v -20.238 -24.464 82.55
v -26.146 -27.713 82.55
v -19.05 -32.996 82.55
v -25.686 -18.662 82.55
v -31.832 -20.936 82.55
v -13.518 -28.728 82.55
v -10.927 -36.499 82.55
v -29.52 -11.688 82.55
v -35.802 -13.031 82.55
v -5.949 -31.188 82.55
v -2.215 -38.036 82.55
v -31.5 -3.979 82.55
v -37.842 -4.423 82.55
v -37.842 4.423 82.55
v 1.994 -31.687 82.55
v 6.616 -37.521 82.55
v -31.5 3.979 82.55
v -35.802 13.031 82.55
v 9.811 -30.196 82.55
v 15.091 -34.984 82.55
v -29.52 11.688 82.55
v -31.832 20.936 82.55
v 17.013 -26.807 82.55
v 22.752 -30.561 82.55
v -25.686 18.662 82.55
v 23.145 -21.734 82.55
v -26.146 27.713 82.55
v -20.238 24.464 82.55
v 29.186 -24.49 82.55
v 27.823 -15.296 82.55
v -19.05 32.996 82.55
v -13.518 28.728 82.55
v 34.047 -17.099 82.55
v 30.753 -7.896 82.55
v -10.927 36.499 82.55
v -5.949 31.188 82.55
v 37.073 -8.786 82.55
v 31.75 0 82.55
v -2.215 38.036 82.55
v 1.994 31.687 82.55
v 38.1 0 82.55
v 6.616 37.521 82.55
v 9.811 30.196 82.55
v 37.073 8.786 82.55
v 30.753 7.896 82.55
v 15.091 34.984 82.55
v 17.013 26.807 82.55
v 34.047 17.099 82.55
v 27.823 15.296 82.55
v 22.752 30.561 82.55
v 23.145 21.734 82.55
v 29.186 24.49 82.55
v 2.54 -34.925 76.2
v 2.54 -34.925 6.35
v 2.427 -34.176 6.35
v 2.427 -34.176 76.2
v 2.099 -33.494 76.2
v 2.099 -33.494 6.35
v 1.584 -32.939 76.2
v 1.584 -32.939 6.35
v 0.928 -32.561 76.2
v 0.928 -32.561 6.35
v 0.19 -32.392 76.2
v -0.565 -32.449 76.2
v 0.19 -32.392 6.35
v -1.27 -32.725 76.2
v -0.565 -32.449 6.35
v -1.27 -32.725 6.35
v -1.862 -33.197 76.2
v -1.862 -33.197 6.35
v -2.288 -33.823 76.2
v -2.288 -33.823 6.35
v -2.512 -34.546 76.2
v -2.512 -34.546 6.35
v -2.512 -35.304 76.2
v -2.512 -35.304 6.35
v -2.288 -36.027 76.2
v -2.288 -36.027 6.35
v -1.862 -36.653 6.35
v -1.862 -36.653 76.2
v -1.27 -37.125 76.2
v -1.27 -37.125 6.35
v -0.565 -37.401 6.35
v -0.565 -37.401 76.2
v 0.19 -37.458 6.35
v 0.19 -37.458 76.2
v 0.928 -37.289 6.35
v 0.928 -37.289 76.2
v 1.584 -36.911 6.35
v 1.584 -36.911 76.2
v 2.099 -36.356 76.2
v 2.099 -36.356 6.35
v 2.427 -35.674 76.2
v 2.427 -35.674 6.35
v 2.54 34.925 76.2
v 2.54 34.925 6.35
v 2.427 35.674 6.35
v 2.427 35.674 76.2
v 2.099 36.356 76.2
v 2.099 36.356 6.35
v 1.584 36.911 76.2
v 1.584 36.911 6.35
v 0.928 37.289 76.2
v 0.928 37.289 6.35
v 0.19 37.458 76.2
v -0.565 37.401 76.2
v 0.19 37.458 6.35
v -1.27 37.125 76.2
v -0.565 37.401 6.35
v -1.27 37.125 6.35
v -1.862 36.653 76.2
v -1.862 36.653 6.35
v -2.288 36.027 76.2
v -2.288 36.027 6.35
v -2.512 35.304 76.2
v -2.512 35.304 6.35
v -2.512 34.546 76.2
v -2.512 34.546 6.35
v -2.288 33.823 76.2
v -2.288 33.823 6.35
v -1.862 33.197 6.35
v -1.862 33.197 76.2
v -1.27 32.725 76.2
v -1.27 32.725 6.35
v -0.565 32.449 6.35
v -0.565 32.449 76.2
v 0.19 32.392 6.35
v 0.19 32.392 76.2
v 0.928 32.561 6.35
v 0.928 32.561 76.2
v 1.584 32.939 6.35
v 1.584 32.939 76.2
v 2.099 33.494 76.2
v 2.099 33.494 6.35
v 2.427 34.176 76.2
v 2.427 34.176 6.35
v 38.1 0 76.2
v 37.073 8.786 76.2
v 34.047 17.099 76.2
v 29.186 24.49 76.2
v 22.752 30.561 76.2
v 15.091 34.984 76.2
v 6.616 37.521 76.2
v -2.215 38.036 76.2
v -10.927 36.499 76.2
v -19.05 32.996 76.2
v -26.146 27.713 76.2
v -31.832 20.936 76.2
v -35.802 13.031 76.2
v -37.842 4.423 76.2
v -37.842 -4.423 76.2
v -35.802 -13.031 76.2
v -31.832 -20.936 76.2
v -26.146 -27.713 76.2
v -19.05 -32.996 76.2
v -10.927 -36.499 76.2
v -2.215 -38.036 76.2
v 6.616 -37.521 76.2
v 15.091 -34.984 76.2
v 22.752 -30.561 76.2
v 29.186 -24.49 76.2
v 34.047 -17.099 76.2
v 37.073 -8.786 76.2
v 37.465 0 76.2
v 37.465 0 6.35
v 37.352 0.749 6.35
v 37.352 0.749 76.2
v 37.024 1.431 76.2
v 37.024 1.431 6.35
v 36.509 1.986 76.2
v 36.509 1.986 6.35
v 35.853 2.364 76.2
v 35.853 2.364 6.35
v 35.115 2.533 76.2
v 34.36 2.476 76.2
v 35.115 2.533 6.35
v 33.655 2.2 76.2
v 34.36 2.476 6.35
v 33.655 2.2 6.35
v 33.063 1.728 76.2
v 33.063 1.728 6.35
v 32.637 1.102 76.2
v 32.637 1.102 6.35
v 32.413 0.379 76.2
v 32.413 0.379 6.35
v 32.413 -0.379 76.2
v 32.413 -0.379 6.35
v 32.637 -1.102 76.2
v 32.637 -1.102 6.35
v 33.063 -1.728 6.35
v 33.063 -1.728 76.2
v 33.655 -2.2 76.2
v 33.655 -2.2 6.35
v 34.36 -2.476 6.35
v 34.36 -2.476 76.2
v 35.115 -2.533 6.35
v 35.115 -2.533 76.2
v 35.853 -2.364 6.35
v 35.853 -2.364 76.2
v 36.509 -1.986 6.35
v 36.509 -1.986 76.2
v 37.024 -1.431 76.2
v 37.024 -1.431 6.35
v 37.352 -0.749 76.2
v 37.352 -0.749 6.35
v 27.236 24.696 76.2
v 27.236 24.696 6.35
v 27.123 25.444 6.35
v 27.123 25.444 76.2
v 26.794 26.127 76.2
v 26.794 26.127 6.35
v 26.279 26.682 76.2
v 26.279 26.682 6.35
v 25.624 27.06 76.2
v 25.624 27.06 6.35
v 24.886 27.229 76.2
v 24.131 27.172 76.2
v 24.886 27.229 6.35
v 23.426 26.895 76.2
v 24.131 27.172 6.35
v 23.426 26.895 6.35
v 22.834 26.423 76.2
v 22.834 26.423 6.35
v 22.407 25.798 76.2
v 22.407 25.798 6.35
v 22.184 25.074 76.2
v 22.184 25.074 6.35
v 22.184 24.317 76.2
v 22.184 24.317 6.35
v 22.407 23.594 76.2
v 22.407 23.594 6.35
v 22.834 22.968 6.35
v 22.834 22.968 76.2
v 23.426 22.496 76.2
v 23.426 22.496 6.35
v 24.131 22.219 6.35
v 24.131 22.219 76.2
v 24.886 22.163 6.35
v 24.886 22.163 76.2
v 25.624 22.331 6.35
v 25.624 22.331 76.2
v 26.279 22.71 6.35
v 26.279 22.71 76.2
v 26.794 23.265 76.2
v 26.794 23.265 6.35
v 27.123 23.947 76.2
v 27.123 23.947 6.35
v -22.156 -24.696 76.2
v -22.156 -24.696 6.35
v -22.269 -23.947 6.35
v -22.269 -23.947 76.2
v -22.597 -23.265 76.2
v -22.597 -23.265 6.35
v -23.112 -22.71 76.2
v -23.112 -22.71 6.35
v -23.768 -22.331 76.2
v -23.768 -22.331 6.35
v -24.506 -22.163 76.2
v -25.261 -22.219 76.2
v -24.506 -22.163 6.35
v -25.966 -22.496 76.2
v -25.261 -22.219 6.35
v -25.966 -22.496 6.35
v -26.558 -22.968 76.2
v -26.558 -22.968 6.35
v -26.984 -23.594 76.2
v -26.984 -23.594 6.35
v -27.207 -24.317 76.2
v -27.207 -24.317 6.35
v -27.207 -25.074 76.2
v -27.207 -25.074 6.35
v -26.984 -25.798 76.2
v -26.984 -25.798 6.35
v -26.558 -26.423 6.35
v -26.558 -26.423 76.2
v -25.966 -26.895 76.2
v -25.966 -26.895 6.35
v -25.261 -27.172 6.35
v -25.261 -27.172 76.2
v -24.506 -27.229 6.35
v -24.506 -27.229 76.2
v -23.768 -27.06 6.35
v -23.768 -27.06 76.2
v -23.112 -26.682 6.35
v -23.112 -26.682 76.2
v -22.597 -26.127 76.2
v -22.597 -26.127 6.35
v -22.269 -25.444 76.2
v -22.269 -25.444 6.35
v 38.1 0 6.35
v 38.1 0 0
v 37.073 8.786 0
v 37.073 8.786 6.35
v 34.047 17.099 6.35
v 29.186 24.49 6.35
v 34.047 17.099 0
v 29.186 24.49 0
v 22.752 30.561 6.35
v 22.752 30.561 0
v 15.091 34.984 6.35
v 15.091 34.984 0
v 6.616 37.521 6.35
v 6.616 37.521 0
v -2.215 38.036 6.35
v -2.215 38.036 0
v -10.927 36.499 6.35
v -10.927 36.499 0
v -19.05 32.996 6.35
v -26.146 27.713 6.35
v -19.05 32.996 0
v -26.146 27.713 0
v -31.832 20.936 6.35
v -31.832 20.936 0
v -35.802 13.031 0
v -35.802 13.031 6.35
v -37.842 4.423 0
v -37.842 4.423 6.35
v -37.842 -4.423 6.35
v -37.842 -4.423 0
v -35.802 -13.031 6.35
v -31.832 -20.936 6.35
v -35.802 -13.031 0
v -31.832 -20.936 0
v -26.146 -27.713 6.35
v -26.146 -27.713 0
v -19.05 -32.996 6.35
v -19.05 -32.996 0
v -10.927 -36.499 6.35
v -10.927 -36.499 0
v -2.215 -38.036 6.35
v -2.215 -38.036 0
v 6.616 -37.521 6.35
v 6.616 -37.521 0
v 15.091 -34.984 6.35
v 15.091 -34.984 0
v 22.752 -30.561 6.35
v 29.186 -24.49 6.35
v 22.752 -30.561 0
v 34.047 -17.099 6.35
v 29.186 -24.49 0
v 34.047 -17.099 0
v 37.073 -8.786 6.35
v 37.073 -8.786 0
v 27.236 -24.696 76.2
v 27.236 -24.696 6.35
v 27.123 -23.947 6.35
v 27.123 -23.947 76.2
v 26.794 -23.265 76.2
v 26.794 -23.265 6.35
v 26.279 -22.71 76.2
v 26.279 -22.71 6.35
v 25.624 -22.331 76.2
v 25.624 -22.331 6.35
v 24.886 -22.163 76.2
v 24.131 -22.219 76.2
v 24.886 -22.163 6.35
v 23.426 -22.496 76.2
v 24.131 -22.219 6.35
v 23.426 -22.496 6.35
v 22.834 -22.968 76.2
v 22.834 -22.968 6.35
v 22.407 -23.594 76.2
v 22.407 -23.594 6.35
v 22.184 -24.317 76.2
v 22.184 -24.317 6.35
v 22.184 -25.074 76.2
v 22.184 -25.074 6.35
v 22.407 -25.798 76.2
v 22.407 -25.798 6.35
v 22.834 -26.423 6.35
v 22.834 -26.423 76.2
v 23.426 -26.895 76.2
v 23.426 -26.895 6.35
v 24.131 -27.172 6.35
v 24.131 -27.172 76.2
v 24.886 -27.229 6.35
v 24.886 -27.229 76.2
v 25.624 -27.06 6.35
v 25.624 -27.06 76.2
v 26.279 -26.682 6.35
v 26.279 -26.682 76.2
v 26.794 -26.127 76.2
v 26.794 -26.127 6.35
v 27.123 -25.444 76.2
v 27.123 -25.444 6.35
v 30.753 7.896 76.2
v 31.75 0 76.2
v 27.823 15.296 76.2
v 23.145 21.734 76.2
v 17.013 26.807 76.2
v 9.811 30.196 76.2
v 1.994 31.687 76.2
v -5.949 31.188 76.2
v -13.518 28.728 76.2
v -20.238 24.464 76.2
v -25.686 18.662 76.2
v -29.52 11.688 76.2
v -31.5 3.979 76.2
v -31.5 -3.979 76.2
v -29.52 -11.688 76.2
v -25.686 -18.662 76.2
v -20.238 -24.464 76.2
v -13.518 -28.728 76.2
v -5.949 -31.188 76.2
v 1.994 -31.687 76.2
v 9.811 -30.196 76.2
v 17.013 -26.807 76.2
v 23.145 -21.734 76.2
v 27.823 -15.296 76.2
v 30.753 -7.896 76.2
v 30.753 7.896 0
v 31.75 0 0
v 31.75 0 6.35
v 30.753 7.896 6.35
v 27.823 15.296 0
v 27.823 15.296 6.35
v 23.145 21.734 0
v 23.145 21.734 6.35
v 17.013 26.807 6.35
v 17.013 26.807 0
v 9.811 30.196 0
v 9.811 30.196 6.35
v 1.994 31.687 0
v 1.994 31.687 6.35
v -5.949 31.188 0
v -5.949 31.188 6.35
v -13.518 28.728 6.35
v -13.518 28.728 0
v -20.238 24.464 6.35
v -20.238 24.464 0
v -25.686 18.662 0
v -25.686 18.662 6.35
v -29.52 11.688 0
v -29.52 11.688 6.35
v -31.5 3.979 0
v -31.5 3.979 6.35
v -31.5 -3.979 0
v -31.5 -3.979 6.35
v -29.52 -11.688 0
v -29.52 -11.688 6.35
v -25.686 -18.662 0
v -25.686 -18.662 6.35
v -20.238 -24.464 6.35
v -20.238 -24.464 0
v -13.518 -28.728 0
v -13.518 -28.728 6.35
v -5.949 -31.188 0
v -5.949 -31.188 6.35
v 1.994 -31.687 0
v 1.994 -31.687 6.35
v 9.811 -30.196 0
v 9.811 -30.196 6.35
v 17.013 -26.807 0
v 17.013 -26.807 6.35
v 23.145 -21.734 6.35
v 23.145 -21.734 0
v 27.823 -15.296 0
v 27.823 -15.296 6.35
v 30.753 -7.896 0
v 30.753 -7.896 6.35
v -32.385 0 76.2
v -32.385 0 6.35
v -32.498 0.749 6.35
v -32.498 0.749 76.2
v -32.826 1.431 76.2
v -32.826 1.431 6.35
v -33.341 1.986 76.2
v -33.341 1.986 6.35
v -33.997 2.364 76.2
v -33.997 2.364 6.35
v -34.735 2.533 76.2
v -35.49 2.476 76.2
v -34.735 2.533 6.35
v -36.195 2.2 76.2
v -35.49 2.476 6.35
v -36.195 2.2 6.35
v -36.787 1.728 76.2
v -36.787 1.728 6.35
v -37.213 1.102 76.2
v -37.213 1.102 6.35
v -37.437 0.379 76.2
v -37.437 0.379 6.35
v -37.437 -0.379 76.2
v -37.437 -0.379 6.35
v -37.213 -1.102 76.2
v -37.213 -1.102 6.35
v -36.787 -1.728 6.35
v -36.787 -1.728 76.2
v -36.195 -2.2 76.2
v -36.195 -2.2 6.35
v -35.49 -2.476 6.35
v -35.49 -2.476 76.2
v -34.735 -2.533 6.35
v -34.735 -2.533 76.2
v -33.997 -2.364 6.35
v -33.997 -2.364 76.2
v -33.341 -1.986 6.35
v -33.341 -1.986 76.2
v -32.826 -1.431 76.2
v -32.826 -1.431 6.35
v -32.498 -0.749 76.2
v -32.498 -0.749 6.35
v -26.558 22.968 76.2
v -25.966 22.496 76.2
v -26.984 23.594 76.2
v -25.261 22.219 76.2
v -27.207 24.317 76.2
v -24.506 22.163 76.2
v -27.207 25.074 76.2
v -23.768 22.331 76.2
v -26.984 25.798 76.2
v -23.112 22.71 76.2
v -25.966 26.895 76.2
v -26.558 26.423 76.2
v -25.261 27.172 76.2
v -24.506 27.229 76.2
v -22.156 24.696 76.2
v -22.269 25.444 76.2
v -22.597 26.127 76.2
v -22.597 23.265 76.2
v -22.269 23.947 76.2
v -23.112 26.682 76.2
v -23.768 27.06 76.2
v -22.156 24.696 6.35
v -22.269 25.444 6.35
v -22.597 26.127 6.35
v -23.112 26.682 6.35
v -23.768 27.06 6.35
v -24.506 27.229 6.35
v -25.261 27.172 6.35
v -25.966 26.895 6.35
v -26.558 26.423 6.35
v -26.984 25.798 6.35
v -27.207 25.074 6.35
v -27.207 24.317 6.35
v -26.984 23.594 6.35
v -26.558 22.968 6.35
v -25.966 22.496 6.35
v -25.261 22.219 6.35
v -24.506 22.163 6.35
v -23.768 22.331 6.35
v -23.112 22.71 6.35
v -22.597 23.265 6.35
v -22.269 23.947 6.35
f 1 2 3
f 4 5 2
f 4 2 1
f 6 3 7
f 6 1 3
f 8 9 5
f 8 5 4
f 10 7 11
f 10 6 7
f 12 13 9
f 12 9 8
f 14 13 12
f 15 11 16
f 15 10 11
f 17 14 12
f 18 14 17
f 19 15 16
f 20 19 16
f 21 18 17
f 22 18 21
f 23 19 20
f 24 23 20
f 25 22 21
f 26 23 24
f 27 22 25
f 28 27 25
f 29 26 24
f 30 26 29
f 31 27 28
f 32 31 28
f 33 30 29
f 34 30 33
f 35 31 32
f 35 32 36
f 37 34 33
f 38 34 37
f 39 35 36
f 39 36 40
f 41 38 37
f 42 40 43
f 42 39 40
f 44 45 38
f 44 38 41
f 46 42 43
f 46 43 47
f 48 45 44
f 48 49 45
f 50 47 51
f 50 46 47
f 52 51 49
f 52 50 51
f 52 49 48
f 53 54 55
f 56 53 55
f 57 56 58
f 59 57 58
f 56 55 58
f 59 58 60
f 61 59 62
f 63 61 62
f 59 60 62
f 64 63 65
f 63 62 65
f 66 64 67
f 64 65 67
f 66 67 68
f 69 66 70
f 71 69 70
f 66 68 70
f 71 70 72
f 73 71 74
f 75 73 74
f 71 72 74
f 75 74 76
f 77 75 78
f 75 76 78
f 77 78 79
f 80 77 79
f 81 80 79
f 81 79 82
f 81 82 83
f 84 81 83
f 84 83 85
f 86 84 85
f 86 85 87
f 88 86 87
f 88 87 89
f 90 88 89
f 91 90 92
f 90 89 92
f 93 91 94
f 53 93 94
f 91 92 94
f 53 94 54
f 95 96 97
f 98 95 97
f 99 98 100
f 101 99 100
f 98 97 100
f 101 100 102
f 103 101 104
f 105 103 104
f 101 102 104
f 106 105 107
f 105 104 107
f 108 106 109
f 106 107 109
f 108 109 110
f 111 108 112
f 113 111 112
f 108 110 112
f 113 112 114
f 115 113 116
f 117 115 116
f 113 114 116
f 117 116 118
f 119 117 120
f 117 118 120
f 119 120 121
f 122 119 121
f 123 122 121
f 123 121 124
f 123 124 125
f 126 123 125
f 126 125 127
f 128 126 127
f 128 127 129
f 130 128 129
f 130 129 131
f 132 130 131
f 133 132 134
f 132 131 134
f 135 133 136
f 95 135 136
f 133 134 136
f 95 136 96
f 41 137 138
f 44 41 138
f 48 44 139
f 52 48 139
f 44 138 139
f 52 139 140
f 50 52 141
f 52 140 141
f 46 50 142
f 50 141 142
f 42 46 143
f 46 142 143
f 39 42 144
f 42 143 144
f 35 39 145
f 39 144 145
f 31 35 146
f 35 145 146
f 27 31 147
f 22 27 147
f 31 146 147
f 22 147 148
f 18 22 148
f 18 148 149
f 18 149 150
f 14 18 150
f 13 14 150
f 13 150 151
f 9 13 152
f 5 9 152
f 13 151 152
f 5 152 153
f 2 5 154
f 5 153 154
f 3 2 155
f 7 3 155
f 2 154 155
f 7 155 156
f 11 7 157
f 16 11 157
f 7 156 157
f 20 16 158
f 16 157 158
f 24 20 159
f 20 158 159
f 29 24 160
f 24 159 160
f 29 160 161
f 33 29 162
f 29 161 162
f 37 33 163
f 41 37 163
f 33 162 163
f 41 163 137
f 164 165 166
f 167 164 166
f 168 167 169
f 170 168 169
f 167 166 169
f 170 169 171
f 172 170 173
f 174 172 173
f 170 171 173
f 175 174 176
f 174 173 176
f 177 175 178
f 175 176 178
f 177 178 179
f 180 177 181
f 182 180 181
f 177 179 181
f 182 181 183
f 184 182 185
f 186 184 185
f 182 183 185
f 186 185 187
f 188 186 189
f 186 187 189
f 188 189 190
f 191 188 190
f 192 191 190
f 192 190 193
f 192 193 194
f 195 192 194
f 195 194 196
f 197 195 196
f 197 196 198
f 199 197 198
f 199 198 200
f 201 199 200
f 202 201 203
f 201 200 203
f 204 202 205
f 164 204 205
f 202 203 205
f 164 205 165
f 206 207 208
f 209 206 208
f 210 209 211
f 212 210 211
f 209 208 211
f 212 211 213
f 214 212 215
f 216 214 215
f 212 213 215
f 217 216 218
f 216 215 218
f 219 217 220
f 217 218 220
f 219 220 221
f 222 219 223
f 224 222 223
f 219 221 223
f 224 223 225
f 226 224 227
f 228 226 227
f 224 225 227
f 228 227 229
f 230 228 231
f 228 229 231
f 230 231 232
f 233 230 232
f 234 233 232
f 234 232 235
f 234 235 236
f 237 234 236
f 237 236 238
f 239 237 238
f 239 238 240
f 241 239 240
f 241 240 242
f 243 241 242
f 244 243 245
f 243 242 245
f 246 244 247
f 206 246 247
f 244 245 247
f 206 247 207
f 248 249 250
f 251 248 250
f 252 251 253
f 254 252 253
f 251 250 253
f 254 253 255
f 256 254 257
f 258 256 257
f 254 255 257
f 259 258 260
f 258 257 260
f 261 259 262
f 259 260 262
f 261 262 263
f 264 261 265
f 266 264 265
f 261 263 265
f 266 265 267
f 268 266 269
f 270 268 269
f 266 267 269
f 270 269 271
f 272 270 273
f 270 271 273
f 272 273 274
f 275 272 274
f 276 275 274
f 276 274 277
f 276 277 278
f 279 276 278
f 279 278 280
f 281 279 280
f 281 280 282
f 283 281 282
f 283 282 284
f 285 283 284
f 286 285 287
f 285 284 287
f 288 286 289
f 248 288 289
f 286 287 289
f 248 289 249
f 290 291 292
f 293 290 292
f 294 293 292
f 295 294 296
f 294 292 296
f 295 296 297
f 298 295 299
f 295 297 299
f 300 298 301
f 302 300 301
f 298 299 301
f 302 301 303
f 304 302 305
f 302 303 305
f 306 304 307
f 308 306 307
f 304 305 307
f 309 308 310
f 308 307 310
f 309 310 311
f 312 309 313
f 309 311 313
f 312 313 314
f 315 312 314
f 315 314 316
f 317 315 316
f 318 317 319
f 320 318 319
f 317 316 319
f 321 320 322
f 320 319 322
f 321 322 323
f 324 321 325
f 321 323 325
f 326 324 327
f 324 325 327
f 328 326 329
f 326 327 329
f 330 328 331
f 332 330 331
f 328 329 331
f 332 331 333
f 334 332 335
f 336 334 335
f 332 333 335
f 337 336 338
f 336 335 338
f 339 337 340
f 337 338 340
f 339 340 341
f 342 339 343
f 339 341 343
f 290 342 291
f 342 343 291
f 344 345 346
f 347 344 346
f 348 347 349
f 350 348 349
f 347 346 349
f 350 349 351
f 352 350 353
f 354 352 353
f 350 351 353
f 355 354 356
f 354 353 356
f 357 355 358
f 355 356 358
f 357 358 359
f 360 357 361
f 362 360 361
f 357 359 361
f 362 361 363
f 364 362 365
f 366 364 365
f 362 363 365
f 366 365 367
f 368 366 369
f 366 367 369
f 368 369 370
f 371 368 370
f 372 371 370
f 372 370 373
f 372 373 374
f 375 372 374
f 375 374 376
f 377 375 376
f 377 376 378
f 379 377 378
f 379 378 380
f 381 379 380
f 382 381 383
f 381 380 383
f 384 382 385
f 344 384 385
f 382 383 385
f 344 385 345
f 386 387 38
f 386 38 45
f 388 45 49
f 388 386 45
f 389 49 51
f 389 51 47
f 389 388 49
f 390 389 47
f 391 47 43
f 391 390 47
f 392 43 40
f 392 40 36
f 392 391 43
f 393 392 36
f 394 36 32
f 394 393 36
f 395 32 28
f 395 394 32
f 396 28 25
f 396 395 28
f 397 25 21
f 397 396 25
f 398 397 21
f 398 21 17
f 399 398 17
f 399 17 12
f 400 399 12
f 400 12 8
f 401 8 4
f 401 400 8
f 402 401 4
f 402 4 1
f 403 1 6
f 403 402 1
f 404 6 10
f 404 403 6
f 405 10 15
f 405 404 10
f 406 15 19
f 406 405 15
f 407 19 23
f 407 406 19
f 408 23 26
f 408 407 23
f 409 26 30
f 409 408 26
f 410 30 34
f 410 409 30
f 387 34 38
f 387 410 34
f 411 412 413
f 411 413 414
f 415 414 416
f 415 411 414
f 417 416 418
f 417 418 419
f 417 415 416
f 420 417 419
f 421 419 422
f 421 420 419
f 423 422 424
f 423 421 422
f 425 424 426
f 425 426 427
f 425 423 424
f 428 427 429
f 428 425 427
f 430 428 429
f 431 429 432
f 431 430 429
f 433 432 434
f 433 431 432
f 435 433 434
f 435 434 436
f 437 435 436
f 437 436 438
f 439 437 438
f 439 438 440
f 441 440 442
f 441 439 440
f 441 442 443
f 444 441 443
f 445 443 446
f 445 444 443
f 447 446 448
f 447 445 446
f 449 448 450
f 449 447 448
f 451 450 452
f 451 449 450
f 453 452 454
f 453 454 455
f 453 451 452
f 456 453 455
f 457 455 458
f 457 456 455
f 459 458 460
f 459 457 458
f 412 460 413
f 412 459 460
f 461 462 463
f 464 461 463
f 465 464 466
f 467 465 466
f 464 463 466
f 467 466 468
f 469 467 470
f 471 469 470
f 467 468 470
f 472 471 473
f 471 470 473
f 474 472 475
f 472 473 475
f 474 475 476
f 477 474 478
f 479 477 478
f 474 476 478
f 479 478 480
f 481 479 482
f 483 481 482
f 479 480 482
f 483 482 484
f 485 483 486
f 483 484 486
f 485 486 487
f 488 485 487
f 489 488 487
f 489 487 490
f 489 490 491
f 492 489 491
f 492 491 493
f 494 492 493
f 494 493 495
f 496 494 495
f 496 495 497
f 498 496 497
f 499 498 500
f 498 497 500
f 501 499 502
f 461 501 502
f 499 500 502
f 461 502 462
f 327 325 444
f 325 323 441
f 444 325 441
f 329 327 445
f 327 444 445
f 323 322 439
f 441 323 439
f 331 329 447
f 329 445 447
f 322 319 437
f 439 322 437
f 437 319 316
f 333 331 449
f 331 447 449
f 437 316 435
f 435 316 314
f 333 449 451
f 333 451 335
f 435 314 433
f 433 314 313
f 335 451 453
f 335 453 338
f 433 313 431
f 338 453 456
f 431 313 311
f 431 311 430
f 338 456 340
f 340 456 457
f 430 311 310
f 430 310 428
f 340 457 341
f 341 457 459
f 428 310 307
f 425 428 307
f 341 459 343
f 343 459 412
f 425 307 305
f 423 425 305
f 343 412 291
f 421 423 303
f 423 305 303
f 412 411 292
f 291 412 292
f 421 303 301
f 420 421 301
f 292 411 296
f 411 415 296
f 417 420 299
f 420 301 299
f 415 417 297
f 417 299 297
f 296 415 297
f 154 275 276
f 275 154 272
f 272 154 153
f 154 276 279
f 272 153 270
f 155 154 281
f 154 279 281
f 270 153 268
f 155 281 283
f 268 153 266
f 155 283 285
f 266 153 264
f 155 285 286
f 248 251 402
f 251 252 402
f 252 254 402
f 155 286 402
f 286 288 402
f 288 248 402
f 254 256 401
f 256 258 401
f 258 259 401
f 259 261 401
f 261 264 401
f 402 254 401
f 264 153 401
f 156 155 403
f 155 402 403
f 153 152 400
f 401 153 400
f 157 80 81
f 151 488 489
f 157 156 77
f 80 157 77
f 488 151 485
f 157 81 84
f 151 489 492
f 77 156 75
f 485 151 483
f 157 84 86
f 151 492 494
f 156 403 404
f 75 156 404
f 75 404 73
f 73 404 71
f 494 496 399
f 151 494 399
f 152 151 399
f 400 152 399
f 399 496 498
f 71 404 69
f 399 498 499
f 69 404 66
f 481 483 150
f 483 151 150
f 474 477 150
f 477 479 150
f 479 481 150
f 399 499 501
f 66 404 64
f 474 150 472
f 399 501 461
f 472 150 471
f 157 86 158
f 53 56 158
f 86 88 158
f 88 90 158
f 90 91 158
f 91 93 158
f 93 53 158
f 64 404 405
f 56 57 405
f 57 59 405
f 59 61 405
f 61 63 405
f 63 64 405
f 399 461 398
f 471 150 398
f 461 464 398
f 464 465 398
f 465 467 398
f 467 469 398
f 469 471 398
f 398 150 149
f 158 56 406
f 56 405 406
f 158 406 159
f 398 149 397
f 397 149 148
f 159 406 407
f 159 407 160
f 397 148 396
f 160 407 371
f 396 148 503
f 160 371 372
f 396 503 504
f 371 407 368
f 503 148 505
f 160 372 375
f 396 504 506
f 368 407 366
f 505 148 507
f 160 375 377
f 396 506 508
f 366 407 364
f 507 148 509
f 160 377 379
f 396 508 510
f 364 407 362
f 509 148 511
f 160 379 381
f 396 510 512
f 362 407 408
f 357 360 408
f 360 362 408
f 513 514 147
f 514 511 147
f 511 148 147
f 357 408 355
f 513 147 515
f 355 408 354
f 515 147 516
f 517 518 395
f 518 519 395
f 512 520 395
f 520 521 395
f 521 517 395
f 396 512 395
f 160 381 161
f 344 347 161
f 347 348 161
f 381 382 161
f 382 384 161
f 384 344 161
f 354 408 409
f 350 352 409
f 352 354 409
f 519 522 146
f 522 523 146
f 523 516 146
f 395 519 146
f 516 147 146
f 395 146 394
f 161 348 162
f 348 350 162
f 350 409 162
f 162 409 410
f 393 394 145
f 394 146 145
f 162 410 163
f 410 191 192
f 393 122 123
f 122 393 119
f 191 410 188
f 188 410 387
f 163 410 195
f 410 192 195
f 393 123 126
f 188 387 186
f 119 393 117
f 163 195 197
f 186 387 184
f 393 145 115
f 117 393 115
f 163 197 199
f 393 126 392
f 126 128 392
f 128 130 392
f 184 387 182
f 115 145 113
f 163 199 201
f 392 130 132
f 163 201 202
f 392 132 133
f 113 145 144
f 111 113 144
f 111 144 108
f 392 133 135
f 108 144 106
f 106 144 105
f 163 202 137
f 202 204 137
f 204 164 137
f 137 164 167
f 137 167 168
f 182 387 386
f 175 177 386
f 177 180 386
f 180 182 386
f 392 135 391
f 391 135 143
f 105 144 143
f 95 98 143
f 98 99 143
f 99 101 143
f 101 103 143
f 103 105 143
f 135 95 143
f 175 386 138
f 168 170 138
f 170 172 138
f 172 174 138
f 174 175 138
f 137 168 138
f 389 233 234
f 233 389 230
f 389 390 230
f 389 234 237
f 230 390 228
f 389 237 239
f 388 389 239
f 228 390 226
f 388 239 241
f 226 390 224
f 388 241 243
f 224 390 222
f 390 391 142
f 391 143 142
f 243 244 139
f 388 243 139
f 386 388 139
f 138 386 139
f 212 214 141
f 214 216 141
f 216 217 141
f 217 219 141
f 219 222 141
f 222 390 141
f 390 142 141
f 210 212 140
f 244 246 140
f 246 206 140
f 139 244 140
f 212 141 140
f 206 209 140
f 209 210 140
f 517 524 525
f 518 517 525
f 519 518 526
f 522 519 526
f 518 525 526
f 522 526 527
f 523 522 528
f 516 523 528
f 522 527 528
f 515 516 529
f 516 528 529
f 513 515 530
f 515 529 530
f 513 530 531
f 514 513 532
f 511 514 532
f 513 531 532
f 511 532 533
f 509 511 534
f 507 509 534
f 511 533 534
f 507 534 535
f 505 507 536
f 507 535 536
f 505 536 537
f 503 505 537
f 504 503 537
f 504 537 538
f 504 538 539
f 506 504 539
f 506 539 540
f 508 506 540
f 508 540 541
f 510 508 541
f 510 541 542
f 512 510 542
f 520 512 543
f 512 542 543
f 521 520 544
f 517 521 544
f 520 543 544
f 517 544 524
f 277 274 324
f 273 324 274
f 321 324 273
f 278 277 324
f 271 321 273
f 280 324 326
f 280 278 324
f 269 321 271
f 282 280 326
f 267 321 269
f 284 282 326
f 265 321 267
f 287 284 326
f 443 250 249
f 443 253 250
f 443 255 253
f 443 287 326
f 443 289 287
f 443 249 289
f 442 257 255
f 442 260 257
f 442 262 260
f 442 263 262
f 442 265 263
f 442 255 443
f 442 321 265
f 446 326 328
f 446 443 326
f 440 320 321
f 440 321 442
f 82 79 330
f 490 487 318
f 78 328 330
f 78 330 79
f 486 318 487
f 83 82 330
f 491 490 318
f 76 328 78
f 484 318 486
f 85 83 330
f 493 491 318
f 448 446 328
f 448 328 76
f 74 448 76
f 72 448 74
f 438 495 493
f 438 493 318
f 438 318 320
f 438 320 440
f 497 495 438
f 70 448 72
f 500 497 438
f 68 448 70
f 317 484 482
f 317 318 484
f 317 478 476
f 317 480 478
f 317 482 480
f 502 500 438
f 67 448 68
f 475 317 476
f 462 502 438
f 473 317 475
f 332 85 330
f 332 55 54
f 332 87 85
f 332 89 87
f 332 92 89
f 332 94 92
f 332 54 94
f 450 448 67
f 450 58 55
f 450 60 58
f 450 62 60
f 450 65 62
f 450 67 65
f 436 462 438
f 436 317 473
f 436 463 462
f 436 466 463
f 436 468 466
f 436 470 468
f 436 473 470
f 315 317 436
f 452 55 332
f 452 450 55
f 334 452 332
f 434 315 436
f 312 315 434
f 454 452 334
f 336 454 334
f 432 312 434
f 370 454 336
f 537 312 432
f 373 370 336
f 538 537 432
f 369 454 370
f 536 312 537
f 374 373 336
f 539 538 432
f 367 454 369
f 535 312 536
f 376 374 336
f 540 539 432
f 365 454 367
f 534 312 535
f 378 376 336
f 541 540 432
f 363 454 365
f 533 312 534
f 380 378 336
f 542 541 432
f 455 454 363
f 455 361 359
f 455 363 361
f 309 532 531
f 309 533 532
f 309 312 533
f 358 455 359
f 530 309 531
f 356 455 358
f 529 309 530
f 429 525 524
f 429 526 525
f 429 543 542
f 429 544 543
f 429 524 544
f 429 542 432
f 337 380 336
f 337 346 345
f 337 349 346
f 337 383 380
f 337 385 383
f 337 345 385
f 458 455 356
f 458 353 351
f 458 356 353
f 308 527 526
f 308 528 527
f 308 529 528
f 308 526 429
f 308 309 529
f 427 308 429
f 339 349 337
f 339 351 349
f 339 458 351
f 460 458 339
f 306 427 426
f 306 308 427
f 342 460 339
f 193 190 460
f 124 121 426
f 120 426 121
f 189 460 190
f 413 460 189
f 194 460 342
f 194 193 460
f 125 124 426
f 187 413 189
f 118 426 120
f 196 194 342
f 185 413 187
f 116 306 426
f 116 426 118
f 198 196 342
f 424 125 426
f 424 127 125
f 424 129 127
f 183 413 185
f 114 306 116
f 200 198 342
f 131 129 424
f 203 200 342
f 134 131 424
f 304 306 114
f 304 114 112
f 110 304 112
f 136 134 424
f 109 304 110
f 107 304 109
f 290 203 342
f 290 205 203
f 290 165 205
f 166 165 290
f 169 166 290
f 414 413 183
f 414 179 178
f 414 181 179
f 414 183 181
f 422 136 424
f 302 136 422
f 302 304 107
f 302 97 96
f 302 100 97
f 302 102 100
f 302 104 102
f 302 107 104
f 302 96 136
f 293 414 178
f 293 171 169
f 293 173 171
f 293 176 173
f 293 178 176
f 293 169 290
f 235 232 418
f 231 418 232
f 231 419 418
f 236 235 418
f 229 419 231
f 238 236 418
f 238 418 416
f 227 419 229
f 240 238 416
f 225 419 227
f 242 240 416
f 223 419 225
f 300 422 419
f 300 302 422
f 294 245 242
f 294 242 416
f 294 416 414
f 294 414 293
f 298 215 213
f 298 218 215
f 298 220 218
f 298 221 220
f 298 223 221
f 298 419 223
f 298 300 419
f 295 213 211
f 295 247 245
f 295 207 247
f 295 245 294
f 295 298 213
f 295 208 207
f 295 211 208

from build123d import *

# Parameters (mm, degrees)
F0_R     = 38.1
F0_R_2   = 31.75
F1_DEPTH = 6.35
F2_R     = 2.54
F3_DEPTH = 69.85
F4_R     = 38.1
F4_R_2   = 31.75
F4_R_3   = 2.54
F5_DEPTH = 6.35


with BuildPart() as f1:
    # F0 (on Top) → F1 (new body)
    with BuildSketch(Plane.XY):
        Circle(F0_R)
        Circle(F0_R_2, mode=Mode.SUBTRACT)
    extrude(amount=F1_DEPTH)

    # F2 (on face) → F3 (join)
    with BuildSketch(Plane.XY.offset(6.35)):
        with Locations((24.695704, 24.695704)):
            Circle(F2_R)
        with Locations((34.925, 0)):
            Circle(F2_R)
        with Locations((24.695704, -24.695704)):
            Circle(F2_R)
        with Locations((0, -34.925)):
            Circle(F2_R)
        with Locations((-24.695704, -24.695704)):
            Circle(F2_R)
        with Locations((-34.925, 0)):
            Circle(F2_R)
        with Locations((-24.695704, 24.695704)):
            Circle(F2_R)
        with Locations((0, 34.925)):
            Circle(F2_R)
    extrude(amount=F3_DEPTH)

    # F4 (on face) → F5 (join)
    with BuildSketch(Plane.XY.offset(76.2)):
        Circle(F4_R)
        Circle(F4_R_2, mode=Mode.SUBTRACT)
        with Locations((0, 34.925)):
            Circle(F4_R_3, mode=Mode.SUBTRACT)
        with Locations((0, 34.925)):
            Circle(F4_R_3)
    extrude(amount=F5_DEPTH)


solid = f1.part
